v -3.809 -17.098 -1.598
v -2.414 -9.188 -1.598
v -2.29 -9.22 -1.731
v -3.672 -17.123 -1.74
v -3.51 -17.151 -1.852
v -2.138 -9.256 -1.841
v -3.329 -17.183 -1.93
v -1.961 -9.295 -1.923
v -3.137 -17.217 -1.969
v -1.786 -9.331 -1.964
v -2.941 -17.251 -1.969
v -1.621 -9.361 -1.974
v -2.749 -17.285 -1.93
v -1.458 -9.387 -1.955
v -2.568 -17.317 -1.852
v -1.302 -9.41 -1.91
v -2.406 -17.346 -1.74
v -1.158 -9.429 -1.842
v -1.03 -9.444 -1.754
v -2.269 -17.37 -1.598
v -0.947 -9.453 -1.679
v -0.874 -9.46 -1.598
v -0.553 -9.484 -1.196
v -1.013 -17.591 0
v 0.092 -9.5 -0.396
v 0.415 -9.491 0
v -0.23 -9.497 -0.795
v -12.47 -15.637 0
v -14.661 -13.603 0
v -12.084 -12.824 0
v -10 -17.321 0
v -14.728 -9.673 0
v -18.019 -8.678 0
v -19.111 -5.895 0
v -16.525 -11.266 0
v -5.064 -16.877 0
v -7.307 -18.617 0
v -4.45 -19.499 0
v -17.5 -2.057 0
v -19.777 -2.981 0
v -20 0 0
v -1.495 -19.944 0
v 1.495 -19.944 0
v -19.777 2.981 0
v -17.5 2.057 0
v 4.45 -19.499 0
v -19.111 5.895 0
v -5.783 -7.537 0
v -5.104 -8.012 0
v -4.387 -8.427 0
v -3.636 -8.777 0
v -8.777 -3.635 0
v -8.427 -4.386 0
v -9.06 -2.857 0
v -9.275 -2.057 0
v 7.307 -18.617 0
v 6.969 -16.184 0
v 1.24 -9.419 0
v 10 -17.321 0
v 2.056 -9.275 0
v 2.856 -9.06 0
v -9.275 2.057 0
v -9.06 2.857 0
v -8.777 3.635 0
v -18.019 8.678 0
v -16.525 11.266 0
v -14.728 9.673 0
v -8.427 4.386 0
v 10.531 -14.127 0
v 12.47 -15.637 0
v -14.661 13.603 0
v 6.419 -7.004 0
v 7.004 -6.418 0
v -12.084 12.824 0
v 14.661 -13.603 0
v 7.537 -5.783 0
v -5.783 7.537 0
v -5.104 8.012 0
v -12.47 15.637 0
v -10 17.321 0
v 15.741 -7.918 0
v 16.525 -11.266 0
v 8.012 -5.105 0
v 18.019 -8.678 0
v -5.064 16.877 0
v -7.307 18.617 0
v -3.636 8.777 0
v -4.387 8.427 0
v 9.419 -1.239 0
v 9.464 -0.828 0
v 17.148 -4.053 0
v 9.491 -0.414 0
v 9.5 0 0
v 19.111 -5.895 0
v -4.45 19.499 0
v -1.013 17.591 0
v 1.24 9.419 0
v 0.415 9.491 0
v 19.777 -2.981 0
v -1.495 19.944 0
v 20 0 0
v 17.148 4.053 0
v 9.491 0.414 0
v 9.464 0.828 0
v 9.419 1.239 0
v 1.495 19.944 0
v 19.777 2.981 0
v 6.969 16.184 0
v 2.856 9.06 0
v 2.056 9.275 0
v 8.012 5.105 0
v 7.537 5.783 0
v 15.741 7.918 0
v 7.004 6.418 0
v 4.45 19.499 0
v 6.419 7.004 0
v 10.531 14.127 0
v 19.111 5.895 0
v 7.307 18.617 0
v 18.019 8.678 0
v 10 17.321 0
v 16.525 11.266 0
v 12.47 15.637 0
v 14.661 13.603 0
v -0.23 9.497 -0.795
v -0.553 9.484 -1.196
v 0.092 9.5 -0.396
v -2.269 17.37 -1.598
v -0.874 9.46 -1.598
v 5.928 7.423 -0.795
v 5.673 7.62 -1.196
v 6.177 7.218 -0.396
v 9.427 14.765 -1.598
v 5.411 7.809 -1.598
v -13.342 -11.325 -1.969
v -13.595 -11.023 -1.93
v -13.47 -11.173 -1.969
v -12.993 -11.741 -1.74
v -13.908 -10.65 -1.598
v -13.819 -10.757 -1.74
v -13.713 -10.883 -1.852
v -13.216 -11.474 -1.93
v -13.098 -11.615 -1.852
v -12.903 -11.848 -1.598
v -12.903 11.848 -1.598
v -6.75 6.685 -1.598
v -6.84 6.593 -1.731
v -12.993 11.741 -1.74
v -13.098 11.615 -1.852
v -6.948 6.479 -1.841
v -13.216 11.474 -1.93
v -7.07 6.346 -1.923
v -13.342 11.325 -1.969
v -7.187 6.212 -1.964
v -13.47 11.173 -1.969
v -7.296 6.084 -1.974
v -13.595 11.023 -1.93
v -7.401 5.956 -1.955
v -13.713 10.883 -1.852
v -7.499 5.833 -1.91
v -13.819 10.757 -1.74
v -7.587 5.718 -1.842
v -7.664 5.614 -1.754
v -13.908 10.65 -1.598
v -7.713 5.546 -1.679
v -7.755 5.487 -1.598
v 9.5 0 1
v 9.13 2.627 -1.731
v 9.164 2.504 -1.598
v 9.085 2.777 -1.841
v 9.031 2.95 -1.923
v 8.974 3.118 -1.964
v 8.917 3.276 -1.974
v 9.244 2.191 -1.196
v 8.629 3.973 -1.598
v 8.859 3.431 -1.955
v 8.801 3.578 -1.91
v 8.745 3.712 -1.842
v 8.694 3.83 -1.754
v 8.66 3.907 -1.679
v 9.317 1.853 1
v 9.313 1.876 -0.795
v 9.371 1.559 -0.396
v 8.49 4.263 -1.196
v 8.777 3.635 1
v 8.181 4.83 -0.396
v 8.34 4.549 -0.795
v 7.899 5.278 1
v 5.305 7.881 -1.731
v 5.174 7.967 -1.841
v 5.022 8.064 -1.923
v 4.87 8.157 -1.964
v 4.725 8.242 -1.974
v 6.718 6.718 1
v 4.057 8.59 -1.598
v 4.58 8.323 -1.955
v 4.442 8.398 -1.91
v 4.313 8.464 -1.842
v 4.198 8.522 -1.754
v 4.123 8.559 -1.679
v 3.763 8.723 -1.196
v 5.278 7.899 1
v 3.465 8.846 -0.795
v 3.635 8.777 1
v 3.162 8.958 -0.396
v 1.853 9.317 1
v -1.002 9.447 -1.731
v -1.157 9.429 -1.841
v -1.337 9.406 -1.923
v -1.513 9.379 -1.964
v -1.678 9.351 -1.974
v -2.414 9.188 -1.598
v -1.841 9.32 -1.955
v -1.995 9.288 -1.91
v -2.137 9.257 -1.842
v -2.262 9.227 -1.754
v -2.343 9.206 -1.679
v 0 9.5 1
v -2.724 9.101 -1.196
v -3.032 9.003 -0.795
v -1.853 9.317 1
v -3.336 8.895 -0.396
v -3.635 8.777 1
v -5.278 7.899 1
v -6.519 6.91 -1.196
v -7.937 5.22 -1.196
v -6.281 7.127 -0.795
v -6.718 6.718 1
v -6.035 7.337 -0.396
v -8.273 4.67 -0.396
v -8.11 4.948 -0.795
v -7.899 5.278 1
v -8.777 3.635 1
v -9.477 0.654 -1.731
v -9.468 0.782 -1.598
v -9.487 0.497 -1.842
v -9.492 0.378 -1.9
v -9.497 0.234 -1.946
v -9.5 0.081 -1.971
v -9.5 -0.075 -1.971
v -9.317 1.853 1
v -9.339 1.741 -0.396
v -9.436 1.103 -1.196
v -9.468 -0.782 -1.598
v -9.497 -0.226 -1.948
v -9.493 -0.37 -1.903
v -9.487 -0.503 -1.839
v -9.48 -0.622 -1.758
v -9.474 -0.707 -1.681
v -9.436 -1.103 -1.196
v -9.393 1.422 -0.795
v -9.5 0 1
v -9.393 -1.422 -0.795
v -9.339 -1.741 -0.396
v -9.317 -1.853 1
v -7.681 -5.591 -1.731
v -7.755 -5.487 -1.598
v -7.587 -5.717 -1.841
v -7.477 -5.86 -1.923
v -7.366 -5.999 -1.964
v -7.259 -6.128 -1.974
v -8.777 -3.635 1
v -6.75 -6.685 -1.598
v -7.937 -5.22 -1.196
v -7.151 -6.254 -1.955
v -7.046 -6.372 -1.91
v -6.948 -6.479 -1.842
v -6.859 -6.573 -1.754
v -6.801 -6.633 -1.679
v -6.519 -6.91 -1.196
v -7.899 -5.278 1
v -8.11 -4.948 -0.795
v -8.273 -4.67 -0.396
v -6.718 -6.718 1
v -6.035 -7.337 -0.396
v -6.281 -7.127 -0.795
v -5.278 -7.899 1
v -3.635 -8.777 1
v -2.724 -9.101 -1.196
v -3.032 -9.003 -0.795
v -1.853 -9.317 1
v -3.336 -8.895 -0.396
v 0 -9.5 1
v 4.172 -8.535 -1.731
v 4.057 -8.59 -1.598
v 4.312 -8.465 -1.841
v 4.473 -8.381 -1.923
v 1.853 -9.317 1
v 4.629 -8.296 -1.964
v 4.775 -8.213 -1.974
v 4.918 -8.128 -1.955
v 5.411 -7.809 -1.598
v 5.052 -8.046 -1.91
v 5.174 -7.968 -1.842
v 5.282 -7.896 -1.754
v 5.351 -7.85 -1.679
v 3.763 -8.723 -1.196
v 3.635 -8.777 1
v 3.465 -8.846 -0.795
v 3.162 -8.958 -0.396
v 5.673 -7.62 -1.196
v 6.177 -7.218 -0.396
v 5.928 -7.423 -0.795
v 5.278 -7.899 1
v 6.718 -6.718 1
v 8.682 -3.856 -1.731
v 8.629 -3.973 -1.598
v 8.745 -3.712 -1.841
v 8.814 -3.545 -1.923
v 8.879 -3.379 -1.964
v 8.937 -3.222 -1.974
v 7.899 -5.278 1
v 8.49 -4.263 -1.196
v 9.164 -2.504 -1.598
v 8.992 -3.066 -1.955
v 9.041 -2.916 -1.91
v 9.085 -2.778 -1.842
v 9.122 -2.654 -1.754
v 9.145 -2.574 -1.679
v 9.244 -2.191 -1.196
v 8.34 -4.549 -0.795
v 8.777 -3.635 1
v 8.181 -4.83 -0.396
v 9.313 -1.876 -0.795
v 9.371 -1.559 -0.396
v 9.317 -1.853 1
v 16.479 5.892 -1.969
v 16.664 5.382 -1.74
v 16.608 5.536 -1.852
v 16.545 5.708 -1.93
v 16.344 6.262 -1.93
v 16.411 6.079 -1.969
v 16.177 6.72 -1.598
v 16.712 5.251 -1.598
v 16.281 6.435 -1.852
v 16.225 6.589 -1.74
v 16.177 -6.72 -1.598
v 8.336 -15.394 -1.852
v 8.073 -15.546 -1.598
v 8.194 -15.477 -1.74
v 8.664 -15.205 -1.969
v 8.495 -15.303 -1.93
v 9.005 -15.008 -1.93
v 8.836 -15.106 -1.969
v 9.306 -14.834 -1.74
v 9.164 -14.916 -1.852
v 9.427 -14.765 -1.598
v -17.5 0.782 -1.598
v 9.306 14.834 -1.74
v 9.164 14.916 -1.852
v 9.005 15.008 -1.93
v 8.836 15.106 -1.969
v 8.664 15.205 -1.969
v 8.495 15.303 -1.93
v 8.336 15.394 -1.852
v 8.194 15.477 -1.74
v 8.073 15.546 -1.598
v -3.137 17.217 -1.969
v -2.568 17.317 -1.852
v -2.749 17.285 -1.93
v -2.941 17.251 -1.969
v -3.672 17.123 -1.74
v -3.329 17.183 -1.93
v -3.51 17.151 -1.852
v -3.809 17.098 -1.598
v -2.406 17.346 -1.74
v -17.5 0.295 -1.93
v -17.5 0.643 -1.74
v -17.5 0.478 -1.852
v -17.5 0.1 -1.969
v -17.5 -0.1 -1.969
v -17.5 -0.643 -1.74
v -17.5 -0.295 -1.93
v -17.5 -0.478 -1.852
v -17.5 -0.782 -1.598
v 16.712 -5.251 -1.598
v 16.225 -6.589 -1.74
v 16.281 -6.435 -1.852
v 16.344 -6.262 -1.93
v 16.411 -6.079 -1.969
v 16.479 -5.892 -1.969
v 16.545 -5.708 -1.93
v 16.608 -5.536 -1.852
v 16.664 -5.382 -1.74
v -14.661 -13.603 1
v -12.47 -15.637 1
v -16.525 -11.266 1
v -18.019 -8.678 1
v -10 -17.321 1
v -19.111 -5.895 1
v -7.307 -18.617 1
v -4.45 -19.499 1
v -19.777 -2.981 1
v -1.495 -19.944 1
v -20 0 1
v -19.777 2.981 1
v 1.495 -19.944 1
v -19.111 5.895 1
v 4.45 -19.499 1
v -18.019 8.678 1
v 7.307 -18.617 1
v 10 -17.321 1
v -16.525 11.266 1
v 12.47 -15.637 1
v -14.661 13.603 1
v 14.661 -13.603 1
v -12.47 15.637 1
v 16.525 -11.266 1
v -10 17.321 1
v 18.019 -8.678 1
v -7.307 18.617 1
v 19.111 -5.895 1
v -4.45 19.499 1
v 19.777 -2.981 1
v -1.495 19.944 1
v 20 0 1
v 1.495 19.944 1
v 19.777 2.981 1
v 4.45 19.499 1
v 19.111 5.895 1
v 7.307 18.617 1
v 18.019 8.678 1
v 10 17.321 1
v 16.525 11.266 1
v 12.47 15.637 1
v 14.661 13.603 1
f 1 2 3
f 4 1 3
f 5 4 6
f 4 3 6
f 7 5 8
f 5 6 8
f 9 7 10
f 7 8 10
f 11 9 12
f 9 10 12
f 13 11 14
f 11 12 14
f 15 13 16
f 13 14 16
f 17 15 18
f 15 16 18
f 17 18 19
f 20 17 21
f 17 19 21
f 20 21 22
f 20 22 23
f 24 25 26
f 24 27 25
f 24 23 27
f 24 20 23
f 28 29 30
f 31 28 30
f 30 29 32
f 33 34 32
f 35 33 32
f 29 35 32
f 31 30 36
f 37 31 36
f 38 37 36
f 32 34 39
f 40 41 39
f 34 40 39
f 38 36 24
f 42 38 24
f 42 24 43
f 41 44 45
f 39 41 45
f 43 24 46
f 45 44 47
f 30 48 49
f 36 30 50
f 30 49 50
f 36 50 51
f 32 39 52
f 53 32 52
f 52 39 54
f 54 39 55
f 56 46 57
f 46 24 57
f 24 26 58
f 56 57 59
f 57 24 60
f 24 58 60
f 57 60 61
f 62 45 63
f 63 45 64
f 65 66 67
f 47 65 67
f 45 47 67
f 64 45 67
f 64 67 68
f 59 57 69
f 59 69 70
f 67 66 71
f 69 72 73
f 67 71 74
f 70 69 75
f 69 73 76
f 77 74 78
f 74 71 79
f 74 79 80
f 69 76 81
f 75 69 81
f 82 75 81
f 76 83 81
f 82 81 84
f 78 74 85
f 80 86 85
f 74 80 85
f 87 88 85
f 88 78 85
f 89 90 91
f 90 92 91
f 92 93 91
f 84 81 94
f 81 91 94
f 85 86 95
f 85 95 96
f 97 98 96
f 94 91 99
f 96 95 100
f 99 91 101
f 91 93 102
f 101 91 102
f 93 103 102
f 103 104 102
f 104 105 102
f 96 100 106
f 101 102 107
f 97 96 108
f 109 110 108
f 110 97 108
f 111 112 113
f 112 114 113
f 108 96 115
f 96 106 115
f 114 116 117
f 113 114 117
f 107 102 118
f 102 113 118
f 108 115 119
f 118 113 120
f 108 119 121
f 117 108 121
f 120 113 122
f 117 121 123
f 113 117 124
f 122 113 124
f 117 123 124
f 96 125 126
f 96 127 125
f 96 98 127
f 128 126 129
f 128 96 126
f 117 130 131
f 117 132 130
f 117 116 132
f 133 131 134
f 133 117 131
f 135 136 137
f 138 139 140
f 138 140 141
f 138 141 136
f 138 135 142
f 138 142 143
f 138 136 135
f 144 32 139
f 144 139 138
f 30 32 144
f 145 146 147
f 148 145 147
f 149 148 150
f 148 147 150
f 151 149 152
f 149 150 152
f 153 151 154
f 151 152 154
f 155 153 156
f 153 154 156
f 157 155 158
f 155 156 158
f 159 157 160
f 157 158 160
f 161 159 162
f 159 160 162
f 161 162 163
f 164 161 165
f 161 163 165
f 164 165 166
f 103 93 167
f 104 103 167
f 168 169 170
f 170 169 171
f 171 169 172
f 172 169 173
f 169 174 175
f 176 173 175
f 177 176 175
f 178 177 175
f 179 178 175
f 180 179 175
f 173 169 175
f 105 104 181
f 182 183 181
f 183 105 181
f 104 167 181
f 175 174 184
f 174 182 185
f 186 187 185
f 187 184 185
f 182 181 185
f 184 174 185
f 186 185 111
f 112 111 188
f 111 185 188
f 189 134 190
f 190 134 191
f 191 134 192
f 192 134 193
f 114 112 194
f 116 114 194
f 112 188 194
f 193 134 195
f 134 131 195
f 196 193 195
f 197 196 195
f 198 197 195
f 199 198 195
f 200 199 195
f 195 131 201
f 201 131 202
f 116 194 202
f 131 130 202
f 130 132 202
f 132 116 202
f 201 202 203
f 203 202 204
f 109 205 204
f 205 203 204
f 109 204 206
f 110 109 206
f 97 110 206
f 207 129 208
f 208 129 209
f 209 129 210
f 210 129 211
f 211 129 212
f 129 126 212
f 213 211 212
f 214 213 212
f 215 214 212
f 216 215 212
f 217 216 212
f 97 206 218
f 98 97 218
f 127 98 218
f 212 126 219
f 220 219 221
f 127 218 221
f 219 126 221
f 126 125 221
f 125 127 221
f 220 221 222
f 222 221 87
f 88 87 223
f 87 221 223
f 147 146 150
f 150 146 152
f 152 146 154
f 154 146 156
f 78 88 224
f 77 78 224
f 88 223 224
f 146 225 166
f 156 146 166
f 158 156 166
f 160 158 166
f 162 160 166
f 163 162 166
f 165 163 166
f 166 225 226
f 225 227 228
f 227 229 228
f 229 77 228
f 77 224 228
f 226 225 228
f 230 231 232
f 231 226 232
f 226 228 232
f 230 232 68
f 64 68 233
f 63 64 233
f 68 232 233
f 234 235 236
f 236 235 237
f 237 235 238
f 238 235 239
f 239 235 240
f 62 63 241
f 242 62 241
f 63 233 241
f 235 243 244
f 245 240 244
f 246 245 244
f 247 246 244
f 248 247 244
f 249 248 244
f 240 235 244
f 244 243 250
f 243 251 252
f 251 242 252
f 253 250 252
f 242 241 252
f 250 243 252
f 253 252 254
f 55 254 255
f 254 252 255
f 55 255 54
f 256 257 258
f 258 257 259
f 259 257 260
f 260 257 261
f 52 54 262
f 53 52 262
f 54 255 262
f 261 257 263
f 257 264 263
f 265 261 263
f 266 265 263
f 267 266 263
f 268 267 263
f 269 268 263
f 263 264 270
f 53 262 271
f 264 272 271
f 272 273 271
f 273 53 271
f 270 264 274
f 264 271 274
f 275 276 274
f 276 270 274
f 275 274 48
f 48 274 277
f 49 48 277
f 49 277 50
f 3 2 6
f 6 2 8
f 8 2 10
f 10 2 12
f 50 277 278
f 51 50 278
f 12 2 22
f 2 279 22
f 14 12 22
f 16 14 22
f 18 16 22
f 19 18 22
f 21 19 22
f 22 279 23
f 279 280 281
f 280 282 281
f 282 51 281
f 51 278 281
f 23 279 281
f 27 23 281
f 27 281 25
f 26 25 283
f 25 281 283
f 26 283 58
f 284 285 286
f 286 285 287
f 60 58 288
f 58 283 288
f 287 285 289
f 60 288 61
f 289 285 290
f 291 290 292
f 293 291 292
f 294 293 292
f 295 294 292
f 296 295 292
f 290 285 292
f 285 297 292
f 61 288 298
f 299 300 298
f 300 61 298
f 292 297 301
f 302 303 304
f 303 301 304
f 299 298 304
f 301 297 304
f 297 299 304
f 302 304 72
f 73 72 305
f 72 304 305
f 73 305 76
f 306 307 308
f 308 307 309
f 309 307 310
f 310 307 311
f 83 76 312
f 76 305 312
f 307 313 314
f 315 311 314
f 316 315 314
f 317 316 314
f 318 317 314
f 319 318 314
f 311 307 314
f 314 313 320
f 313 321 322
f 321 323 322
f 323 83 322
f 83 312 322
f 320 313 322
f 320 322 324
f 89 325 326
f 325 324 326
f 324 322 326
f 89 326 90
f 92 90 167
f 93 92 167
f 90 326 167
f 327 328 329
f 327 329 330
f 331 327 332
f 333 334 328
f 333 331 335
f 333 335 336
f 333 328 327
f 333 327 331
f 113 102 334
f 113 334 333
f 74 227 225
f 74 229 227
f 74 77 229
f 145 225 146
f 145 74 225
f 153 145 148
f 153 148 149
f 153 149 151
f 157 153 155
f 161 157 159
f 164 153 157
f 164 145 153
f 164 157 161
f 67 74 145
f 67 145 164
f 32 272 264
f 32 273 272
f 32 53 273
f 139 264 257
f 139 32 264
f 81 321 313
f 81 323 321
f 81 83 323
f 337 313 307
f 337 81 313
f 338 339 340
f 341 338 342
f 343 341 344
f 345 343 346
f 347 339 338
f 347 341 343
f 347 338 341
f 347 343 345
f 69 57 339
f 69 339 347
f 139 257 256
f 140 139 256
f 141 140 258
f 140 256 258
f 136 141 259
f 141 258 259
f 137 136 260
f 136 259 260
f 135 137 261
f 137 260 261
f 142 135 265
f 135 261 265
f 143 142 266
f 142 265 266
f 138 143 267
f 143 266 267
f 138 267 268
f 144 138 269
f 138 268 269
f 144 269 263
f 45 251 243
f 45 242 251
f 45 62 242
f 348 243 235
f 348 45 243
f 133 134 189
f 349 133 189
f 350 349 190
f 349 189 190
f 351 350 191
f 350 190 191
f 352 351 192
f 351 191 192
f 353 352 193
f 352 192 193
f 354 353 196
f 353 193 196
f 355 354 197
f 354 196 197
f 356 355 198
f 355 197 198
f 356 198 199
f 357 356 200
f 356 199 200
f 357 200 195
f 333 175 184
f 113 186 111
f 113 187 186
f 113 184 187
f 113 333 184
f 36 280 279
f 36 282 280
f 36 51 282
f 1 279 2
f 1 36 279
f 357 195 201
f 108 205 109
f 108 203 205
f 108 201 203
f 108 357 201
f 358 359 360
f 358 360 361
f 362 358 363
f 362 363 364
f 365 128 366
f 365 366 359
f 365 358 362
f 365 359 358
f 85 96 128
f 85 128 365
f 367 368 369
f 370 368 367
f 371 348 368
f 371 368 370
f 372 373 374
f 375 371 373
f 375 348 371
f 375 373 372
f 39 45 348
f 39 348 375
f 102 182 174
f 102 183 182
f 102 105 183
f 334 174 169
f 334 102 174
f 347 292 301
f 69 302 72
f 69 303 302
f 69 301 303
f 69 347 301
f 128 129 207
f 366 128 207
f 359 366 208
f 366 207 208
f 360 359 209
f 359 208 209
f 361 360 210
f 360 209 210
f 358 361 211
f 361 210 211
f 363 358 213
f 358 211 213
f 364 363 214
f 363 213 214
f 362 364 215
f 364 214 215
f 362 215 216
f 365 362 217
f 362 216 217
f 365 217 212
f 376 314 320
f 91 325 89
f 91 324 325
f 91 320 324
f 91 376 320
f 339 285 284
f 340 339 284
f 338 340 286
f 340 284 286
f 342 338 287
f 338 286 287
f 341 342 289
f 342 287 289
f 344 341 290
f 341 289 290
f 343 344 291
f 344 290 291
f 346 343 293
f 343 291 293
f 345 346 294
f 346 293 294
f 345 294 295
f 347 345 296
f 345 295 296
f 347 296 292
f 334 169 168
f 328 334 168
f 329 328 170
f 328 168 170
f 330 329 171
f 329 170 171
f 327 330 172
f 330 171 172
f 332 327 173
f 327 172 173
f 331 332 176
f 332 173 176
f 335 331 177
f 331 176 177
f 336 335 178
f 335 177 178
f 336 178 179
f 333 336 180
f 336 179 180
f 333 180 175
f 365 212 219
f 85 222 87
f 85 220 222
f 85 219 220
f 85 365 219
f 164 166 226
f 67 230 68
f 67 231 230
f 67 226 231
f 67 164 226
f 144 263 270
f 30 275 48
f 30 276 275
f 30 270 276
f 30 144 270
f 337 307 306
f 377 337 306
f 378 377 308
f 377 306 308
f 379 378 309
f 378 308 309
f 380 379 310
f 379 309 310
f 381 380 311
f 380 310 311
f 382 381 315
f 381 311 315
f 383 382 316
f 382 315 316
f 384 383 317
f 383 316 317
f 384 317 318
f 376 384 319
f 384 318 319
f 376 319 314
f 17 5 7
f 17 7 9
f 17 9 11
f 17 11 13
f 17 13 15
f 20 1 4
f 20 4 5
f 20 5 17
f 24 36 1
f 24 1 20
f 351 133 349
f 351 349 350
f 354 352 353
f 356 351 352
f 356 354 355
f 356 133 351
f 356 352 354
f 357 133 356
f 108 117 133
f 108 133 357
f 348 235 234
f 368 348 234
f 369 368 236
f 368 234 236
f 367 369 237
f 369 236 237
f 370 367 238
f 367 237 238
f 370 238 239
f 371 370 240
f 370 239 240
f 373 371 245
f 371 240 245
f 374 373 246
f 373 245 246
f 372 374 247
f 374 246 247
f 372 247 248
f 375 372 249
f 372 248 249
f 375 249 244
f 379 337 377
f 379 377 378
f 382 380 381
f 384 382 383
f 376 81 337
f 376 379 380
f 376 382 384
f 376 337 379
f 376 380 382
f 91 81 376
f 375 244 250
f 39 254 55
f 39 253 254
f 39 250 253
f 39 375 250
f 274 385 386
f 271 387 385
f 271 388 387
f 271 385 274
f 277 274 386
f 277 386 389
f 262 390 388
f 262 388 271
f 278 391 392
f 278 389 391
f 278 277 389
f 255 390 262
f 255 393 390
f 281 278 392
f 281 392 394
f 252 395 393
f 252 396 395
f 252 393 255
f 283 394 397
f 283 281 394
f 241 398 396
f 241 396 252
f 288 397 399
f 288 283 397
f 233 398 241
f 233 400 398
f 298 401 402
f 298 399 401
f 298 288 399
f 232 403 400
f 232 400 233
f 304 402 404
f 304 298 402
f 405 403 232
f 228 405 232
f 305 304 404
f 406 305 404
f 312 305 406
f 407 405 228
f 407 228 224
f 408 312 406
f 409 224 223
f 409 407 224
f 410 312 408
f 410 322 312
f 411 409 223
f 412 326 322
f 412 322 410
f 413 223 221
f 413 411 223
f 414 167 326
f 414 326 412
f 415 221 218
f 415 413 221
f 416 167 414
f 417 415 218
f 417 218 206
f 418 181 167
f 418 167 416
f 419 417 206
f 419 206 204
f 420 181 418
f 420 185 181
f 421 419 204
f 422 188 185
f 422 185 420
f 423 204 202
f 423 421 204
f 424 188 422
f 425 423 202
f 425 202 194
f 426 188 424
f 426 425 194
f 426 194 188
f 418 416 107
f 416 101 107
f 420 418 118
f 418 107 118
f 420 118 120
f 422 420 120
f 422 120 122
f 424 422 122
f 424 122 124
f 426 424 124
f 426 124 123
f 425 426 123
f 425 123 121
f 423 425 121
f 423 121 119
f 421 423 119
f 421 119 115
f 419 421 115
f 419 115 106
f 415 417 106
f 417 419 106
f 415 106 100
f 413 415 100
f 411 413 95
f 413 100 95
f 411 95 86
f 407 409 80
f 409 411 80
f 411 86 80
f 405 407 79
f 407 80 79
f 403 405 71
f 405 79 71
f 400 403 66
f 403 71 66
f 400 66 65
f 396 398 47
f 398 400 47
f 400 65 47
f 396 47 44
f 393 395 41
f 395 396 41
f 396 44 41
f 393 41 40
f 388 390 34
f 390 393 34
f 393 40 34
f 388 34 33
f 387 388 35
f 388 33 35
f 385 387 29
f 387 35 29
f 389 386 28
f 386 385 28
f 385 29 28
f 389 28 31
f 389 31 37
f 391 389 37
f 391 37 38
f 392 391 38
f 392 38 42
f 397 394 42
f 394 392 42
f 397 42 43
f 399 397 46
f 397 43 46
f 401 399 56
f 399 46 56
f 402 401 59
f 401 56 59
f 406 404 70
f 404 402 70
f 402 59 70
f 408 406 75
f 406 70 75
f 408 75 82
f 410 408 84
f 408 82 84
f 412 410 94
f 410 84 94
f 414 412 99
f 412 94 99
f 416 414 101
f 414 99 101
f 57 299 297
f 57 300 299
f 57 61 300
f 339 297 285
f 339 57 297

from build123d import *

# Parameters (mm, degrees)
F0_R     = 20
F0_R_2   = 9.5
F1_DEPTH = 1
F6_DEPTH = 5
F7_COUNT = 9
F8_R     = 1
F9_DEPTH = 5


with BuildPart() as f1:
    # F0 (on Top) → F1 (new body)
    with BuildSketch(Plane.XY):
        Circle(F0_R)
        Circle(F0_R_2, mode=Mode.SUBTRACT)
        Circle(F0_R_2)
    extrude(amount=F1_DEPTH)

    # F5 (on line) → F6 (join, symmetric)
    with BuildSketch(Plane(origin=(-12.5, 0, 0), x_dir=(0, -1, 0), z_dir=(-1, 0, 0))):
        Polygon((2.0567882708, 0), (-2.0567882708, 0), (0, -2.5773376692), align=None)
    extrude(amount=F6_DEPTH, both=True)

    # F7: F1 ×9 about axis
    f7_axis = Axis((0, 0, 0), (0, 0, 1))


with BuildPart() as f1_1:
    add(f1.part)
    for i in range(1, F7_COUNT):
        add(f1.part.rotate(f7_axis, i * 360 / F7_COUNT))

    # F8
    f8_edges = [f1_1.edges().sort_by_distance(p)[0] for p in [
        (-12.5, 0, -2.577338),
        (-9.575556, 8.034845, -2.577338),
        (-2.170602, 12.310097, -2.577338),
        (6.25, 10.825318, -2.577338),
        (11.746158, 4.275252, -2.577338),
        (11.746158, -4.275252, -2.577338),
        (6.25, -10.825318, -2.577338),
        (-2.170602, -12.310097, -2.577338),
        (-9.575556, -8.034845, -2.577338),
    ]]
    fillet(f8_edges, radius=F8_R)

    # F0 (on Top) → F9 (cut, symmetric)
    with BuildSketch(Plane.XY):
        Circle(F0_R_2)
    extrude(amount=F9_DEPTH, both=True, mode=Mode.SUBTRACT)


solid = f1_1.part
